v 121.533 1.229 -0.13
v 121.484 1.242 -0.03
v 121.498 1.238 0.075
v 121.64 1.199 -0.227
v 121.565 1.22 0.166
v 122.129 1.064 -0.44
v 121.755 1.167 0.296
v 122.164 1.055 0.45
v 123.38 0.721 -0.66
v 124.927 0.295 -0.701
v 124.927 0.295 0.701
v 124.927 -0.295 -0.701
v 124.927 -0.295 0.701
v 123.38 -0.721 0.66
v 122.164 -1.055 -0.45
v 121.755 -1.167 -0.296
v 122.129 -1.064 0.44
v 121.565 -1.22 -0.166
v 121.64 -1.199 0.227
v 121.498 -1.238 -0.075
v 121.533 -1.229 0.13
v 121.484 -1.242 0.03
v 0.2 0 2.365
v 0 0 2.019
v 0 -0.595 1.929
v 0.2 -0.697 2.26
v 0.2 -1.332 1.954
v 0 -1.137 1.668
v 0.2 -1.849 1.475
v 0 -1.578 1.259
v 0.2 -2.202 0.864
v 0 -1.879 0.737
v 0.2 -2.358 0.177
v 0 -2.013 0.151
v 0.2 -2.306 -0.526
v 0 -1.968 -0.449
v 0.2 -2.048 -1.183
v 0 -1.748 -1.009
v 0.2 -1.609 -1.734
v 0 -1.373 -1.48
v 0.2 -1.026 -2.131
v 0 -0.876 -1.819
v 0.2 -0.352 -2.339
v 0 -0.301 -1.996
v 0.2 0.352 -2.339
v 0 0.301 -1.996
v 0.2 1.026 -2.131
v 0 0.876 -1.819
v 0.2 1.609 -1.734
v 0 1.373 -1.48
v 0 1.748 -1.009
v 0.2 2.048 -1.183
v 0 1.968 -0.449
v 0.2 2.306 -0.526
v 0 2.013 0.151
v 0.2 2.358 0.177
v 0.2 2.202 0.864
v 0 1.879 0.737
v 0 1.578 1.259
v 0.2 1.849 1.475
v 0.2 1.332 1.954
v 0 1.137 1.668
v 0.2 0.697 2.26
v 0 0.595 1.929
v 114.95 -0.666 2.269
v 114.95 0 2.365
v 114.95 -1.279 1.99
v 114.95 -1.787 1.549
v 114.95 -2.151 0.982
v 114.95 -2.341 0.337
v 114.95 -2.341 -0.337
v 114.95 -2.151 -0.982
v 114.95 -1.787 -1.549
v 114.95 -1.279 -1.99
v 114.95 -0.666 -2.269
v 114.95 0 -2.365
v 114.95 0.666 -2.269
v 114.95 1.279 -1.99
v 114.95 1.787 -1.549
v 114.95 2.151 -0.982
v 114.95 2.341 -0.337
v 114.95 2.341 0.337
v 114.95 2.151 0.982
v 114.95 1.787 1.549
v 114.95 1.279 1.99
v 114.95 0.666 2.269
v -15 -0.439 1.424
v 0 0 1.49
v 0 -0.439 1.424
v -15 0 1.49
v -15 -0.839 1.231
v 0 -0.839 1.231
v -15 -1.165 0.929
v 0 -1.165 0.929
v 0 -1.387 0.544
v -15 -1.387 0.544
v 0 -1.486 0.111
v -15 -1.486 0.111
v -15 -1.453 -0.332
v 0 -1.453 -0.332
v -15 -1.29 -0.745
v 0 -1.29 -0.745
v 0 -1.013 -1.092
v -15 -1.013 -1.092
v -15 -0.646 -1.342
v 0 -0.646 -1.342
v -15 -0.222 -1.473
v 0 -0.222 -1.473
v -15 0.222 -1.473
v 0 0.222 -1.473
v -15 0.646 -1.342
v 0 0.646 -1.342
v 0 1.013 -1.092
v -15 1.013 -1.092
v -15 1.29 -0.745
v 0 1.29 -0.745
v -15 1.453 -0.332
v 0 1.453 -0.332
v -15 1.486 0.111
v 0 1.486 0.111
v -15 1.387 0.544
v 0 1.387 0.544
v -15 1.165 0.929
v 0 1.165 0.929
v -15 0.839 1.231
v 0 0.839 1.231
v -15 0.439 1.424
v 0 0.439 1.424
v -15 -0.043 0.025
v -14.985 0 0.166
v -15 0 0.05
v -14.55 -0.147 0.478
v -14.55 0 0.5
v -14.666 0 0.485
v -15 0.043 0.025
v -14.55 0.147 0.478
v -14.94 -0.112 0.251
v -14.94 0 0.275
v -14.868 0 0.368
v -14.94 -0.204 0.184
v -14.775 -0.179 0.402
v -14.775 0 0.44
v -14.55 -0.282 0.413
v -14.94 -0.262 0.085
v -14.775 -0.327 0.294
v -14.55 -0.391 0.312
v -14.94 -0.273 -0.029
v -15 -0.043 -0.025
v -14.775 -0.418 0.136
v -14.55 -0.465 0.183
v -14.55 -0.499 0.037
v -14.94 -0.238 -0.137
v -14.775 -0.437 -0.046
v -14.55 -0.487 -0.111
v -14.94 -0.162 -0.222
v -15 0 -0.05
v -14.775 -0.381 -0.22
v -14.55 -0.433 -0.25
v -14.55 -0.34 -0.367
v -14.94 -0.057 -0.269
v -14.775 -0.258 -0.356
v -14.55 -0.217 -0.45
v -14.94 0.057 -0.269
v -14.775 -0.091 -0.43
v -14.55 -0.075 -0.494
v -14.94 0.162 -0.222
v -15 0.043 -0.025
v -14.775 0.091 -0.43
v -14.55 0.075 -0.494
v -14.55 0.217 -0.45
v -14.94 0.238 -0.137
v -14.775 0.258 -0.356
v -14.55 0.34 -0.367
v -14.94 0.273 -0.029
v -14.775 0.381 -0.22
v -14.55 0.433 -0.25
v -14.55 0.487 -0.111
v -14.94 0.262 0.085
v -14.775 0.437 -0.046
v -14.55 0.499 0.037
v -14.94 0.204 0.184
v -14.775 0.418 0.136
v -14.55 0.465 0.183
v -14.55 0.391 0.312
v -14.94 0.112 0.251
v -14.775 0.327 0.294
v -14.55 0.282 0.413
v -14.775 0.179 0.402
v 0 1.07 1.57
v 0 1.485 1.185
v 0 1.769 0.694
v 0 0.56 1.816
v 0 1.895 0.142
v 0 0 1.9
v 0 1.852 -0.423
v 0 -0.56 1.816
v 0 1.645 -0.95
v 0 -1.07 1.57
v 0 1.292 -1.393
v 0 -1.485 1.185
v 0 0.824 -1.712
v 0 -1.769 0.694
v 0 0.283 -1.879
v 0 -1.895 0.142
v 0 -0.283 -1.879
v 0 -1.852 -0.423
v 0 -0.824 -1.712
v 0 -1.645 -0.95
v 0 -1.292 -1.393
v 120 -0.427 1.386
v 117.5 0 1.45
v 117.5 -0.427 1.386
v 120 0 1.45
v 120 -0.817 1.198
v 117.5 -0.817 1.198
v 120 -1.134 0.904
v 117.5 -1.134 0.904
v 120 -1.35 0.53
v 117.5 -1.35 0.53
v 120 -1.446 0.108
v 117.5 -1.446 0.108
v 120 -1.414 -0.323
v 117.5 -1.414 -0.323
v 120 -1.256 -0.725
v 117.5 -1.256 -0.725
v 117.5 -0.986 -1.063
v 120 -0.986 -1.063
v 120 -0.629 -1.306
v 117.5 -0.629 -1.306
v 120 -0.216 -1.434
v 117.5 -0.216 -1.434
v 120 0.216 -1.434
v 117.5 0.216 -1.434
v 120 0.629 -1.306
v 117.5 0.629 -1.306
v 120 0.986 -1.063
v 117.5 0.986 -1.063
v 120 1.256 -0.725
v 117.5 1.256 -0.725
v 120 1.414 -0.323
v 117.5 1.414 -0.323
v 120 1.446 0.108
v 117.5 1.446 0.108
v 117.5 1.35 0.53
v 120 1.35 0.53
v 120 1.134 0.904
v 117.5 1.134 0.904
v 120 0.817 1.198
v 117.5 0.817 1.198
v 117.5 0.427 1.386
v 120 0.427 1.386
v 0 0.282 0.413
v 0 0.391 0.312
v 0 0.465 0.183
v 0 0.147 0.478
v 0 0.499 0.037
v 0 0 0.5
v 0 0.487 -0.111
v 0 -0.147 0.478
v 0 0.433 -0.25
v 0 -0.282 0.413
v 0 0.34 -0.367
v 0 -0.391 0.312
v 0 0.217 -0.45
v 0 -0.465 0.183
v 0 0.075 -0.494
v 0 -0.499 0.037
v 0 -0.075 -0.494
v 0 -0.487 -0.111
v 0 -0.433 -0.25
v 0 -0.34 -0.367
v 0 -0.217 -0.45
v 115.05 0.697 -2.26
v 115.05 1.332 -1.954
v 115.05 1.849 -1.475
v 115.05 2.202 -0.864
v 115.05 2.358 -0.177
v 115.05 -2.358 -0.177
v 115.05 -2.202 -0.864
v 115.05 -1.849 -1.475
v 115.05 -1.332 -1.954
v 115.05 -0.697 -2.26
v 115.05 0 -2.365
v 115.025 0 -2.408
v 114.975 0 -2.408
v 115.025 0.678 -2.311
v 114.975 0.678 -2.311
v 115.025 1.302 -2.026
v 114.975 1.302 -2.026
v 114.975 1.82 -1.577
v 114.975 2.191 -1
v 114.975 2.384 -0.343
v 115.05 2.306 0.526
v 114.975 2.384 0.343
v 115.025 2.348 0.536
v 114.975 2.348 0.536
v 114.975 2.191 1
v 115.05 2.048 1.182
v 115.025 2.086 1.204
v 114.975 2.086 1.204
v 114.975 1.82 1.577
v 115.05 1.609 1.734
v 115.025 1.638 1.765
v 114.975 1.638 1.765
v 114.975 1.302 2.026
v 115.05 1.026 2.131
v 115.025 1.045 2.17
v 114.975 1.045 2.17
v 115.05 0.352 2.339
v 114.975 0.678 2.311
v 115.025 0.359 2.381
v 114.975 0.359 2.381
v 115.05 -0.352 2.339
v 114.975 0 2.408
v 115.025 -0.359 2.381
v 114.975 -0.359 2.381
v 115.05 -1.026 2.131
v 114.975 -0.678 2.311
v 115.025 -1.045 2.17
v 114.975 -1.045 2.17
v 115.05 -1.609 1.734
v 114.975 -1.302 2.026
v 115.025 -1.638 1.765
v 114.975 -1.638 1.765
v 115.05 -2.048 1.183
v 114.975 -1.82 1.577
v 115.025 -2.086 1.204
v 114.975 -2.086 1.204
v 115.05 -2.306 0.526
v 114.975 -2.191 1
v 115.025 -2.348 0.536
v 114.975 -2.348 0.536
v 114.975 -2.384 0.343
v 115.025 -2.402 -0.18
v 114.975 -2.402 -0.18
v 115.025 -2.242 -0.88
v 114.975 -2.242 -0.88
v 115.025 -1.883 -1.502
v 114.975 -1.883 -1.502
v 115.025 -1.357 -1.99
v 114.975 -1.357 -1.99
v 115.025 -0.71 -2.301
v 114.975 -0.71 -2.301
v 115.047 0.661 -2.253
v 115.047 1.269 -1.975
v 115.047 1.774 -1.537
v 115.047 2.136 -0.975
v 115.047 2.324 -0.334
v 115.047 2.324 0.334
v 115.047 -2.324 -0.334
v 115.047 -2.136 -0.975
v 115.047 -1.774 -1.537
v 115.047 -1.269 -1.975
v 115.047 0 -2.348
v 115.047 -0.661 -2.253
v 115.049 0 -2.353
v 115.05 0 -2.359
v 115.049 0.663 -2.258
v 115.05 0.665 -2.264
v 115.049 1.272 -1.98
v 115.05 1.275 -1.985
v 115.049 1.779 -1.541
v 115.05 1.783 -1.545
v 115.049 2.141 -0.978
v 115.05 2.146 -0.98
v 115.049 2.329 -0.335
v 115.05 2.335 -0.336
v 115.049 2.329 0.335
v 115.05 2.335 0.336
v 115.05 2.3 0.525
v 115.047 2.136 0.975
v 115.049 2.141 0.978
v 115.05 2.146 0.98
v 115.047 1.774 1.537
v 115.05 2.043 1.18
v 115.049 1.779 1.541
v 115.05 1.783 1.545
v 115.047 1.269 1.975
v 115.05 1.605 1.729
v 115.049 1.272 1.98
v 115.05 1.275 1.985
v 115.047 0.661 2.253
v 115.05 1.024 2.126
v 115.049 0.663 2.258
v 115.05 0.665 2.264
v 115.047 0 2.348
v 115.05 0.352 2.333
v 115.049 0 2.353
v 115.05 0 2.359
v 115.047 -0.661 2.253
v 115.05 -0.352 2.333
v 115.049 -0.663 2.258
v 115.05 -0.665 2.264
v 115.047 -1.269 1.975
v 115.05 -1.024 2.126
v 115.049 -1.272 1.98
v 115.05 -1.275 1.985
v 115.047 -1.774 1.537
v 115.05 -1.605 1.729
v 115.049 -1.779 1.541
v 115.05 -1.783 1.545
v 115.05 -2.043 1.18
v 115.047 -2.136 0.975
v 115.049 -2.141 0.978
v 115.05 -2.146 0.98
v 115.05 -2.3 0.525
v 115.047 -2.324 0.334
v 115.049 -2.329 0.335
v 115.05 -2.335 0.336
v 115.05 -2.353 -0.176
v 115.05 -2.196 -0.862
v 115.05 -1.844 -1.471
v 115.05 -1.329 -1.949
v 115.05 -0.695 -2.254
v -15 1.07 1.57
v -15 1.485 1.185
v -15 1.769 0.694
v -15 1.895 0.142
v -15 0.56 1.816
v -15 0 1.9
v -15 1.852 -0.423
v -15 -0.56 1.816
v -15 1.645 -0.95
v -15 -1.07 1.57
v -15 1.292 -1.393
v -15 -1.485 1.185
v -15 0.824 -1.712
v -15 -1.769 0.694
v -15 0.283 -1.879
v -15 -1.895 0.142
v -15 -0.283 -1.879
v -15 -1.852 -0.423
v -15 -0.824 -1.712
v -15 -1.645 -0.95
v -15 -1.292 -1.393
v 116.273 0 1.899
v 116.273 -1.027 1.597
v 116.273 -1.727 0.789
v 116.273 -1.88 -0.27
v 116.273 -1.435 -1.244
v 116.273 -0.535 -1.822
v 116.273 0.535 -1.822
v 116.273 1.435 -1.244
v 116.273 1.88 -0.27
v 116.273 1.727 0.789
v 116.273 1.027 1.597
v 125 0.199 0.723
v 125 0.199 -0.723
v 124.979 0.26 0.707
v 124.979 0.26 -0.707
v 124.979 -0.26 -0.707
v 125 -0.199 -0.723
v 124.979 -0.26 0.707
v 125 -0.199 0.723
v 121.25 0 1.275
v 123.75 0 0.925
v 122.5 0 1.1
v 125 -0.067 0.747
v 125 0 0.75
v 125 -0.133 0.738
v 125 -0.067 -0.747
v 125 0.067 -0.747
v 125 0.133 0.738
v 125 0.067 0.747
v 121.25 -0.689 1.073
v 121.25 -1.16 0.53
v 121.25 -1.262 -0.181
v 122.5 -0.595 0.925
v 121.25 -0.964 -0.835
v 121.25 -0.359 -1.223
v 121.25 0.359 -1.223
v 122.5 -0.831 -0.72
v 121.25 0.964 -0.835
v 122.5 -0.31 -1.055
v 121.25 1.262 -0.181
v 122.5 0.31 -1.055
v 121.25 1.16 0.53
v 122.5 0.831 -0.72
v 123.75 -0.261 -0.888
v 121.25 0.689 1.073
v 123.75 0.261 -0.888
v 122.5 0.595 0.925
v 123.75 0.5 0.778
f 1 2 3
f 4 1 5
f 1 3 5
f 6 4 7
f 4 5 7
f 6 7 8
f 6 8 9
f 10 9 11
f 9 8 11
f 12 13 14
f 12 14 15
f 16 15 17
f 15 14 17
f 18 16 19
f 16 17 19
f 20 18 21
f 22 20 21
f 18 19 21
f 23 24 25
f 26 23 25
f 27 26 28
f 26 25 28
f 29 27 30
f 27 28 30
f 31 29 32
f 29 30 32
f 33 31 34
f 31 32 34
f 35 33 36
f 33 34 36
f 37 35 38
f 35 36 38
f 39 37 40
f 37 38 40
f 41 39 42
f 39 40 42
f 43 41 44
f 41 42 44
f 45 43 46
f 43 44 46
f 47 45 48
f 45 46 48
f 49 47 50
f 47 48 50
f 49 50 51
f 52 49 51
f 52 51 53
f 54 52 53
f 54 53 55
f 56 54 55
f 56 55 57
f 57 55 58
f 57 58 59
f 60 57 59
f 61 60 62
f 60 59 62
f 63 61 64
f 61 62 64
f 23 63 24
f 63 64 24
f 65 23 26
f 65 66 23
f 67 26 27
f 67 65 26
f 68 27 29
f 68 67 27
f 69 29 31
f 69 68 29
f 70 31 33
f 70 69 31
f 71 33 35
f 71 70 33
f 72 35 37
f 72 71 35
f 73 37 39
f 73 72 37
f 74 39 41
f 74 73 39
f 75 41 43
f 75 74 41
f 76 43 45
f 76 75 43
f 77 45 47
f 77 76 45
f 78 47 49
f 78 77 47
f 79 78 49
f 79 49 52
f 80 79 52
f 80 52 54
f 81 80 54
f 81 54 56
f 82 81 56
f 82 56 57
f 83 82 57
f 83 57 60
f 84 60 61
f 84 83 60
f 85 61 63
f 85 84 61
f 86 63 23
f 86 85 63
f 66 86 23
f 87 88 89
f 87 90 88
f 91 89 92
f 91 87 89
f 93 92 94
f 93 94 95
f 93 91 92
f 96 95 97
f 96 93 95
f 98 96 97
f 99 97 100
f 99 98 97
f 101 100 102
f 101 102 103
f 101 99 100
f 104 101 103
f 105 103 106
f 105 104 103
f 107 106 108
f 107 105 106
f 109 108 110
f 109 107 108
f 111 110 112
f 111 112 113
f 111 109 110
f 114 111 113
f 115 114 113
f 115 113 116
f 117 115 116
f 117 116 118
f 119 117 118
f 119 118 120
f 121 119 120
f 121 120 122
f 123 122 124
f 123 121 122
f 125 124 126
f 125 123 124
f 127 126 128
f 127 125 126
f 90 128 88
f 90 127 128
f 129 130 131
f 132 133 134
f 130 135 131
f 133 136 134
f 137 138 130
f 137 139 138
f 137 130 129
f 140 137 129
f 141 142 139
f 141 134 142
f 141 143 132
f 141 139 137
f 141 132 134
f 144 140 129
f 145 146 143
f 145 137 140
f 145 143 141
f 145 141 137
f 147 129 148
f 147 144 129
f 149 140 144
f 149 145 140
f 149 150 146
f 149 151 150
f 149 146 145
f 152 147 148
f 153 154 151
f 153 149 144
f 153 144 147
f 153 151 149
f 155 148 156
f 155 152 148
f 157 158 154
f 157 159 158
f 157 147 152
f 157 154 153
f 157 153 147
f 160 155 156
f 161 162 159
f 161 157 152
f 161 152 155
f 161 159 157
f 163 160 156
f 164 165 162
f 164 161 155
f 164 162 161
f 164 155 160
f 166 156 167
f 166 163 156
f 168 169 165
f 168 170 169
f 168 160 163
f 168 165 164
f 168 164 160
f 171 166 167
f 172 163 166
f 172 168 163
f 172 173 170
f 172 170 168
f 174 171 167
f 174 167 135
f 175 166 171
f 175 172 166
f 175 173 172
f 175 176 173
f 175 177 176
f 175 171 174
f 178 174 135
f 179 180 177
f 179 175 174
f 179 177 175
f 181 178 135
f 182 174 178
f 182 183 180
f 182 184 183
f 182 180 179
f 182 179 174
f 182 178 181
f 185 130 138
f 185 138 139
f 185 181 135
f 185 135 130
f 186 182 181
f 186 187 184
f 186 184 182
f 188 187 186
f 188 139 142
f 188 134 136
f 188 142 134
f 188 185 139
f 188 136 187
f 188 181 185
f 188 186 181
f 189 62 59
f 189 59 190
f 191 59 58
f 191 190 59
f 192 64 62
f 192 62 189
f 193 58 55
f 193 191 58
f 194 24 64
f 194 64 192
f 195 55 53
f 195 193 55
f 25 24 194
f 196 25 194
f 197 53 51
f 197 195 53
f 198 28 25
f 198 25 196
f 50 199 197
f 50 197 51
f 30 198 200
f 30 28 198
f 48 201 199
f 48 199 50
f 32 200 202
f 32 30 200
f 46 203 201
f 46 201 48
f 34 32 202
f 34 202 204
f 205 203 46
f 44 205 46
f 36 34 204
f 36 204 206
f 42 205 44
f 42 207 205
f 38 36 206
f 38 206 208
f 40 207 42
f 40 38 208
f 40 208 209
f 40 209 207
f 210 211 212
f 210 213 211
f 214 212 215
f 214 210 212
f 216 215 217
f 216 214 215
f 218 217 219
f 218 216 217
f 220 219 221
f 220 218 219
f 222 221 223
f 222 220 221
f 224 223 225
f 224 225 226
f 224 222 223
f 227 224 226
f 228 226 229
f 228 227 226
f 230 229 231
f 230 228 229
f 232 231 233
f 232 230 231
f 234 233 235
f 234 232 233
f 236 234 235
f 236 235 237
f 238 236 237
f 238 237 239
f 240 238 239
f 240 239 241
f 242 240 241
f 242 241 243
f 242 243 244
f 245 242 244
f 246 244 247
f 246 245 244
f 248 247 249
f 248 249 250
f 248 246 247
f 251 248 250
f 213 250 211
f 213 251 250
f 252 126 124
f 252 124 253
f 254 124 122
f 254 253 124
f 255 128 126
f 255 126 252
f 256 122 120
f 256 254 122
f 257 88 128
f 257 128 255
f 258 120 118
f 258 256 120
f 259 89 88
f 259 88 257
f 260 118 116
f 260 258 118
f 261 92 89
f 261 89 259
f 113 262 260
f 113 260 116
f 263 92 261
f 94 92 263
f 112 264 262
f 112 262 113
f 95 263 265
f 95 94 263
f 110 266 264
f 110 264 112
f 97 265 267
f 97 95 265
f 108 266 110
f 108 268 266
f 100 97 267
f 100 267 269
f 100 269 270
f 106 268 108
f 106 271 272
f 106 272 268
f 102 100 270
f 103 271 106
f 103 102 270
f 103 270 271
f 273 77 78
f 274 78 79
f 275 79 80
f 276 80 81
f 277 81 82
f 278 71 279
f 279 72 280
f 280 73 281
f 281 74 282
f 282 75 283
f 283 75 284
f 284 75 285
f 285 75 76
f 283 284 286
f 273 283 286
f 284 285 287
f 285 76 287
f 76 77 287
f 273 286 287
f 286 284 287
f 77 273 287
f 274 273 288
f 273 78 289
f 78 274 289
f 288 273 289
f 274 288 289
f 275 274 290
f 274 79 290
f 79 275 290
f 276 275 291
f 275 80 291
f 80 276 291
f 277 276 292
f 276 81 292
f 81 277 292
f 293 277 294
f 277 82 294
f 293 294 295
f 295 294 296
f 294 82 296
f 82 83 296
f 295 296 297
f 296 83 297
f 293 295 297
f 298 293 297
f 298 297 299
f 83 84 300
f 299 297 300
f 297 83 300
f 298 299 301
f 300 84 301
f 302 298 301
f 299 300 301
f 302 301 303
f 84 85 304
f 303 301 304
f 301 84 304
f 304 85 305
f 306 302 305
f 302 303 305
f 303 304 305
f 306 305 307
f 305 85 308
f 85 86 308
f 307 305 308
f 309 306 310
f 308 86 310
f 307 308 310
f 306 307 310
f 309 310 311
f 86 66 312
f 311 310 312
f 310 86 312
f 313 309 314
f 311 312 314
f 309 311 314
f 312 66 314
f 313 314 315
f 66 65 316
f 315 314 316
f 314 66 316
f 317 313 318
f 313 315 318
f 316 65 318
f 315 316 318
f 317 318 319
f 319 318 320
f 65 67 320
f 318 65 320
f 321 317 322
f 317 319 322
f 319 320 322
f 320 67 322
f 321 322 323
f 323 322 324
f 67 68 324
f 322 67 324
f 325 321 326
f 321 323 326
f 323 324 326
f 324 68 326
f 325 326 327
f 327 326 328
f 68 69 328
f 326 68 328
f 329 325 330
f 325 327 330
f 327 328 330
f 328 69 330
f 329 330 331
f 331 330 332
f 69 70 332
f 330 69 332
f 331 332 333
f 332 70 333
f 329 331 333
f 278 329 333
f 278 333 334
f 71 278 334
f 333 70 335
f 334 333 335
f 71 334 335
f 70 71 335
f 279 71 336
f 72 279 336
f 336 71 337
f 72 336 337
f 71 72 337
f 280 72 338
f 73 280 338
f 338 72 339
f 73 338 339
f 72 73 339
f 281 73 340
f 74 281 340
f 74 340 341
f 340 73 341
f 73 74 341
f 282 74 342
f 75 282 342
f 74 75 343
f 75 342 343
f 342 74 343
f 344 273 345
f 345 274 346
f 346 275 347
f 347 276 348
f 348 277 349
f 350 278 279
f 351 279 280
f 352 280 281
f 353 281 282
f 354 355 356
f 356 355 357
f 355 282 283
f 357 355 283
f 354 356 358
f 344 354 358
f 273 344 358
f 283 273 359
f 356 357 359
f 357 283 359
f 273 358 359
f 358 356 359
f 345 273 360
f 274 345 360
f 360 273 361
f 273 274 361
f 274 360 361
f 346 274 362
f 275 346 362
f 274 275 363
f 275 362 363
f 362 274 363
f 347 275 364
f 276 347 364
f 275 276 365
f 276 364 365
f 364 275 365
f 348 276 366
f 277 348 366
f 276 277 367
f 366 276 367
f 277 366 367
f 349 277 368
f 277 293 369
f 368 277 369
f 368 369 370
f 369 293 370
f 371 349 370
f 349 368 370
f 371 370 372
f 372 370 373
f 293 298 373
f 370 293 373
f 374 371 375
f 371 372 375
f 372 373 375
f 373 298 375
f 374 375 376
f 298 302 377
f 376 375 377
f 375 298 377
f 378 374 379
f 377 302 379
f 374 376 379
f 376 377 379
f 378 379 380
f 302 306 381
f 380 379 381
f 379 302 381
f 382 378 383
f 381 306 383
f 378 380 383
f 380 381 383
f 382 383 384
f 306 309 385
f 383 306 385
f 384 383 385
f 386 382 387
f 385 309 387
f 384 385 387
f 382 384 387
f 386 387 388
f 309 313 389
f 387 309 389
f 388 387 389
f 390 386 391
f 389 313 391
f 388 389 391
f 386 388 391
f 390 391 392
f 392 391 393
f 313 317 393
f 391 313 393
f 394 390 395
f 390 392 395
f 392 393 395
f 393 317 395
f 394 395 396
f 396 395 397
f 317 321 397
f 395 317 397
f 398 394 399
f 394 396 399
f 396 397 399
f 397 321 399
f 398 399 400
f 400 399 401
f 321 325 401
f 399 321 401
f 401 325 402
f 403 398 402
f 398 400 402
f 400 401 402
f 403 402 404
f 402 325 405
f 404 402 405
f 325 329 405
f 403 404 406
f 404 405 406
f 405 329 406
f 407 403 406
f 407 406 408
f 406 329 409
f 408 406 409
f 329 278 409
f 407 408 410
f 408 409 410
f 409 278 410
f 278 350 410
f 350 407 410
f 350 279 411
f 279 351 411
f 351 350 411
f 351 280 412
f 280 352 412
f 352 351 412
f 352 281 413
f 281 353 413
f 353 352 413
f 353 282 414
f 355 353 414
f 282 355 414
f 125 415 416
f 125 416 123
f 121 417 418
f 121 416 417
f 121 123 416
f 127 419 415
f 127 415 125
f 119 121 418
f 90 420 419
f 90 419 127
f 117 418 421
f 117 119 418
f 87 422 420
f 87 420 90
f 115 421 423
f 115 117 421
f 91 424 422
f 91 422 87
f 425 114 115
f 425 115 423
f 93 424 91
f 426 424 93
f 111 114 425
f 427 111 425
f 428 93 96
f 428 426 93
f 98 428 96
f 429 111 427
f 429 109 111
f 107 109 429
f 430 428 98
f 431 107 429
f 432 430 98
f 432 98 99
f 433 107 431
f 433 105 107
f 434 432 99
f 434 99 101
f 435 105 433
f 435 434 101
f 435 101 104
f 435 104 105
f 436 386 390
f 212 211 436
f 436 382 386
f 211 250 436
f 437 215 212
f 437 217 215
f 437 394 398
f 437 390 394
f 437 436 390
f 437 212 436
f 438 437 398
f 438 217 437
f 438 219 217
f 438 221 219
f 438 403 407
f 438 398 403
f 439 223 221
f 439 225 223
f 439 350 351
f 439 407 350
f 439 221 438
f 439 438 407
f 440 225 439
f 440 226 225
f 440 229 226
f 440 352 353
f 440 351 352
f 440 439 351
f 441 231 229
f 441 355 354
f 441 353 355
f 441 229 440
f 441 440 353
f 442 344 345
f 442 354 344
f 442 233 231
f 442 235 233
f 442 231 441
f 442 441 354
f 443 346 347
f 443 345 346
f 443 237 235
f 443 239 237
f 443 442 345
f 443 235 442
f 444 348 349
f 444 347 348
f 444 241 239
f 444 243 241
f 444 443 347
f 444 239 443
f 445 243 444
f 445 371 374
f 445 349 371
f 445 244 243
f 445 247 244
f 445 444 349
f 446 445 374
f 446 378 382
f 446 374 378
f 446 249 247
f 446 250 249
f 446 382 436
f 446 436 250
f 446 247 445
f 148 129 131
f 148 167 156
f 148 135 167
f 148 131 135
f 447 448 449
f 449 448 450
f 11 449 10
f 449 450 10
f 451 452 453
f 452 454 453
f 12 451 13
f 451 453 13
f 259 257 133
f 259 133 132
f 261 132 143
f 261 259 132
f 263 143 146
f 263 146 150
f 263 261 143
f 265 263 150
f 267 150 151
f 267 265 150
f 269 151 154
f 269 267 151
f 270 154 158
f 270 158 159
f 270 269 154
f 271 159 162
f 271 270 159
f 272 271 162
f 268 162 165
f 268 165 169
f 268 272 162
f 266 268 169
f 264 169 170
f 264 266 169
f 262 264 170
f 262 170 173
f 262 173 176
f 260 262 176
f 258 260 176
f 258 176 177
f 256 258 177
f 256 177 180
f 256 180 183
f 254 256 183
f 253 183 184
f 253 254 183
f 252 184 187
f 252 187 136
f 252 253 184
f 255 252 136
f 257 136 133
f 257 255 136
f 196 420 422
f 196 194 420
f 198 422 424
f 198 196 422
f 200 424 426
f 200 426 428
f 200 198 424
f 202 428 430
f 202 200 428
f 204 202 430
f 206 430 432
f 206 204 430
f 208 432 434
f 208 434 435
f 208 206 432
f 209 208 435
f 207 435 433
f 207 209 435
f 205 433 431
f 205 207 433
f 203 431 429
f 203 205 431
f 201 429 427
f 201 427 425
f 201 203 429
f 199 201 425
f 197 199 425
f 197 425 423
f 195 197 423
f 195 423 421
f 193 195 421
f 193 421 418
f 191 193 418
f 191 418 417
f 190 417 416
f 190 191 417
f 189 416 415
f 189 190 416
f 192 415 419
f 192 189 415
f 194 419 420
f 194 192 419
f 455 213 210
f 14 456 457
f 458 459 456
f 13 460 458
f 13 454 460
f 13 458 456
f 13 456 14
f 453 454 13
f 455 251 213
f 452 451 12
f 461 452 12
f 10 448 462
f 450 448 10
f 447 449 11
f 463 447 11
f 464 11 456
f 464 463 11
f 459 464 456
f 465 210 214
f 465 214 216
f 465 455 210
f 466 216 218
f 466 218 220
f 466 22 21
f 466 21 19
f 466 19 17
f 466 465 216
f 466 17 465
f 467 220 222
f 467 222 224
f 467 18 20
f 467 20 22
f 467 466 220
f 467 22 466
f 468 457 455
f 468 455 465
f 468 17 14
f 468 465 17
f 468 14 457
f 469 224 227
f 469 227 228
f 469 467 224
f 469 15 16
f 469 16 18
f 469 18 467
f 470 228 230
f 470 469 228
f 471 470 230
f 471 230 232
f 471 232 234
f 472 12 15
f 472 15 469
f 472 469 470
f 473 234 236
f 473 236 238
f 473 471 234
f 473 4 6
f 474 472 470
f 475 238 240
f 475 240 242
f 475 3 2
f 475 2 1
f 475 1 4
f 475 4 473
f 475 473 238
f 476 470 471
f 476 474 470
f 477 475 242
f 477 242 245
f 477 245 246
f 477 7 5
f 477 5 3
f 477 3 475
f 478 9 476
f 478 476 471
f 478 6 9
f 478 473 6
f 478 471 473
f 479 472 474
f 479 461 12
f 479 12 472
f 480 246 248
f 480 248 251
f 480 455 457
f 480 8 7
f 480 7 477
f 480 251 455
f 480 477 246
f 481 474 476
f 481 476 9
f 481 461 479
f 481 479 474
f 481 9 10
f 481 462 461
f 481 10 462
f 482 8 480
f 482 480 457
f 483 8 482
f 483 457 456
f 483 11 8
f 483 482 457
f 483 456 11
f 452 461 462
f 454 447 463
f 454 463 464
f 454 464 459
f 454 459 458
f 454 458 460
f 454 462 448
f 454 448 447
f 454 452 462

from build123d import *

# Parameters (mm, degrees)
FILLET1_R          = 0.45
CHAMFER1_SIZE      = 0.2
CHAMFER1_SIZE2     = 0.346410162
SKETCH2_R          = 0.05
CUT_EXTRUDE1_DEPTH = 5
FILLET3_R          = 0.1


with BuildPart() as part:
    # Sketch1 → Revolve1 (revolve)
    with BuildSketch(Plane.XY, mode=Mode.PRIVATE) as revolve1_sk:
        Polygon((0, 0), (-15, 0), (-15, 0.5), (0, 0.5), (0, 1.49), (-15, 1.49), (-15, 1.9), (0, 1.9), (0, 2.365), (115, 2.365), (117.5, 1.45), (120, 1.45), (125, 0.75), (125, 0), align=None)
    revolve(revolve1_sk.sketch.rotate(Axis((0, 0, 0), (1, 0, 0)), 90), axis=Axis((0, 0, 0), (1, 0, 0)))

    # Fillet1
    fillet1_edges = [part.edges().sort_by_distance(p)[0] for p in [
        (-15, 0, -0.5),
    ]]
    fillet(fillet1_edges, radius=FILLET1_R)

    # Chamfer1
    chamfer1_edges = [part.edges().sort_by_distance(p)[0] for p in [
        (0, 0, -2.365),
    ]]
    chamfer1_side = [part.faces().sort_by_distance(p)[0] for p in [
        (57.5, 0, -2.365),
    ]]
    chamfer(chamfer1_edges, length=CHAMFER1_SIZE, length2=CHAMFER1_SIZE2, reference=chamfer1_side[0])

    # Sketch2 → Revolve2 (revolve)
    with BuildSketch(Plane.XY, mode=Mode.PRIVATE) as revolve2_sk:
        with Locations((115, 2.365)):
            Circle(SKETCH2_R)
    revolve(revolve2_sk.sketch.rotate(Axis((0, 0, 0), (1, 0, 0)), 270), axis=Axis((0, 0, 0), (1, 0, 0)))

    # Sketch3 → Cut-Extrude1 (cut, symmetric)
    with BuildSketch(Plane.XY):
        Polygon((120, 1.65), (126, 0), (120, -1.65), (129.159329982, -1.65), (129.159329982, 1.65), align=None)
    extrude(amount=CUT_EXTRUDE1_DEPTH, both=True, mode=Mode.SUBTRACT)

    # Fillet3
    fillet3_edges = [part.edges().sort_by_distance(p)[0] for p in [
        (125, -0.275, 0),
        (125, 0.275, 0),
    ]]
    fillet(fillet3_edges, radius=FILLET3_R)


solid = part.part
